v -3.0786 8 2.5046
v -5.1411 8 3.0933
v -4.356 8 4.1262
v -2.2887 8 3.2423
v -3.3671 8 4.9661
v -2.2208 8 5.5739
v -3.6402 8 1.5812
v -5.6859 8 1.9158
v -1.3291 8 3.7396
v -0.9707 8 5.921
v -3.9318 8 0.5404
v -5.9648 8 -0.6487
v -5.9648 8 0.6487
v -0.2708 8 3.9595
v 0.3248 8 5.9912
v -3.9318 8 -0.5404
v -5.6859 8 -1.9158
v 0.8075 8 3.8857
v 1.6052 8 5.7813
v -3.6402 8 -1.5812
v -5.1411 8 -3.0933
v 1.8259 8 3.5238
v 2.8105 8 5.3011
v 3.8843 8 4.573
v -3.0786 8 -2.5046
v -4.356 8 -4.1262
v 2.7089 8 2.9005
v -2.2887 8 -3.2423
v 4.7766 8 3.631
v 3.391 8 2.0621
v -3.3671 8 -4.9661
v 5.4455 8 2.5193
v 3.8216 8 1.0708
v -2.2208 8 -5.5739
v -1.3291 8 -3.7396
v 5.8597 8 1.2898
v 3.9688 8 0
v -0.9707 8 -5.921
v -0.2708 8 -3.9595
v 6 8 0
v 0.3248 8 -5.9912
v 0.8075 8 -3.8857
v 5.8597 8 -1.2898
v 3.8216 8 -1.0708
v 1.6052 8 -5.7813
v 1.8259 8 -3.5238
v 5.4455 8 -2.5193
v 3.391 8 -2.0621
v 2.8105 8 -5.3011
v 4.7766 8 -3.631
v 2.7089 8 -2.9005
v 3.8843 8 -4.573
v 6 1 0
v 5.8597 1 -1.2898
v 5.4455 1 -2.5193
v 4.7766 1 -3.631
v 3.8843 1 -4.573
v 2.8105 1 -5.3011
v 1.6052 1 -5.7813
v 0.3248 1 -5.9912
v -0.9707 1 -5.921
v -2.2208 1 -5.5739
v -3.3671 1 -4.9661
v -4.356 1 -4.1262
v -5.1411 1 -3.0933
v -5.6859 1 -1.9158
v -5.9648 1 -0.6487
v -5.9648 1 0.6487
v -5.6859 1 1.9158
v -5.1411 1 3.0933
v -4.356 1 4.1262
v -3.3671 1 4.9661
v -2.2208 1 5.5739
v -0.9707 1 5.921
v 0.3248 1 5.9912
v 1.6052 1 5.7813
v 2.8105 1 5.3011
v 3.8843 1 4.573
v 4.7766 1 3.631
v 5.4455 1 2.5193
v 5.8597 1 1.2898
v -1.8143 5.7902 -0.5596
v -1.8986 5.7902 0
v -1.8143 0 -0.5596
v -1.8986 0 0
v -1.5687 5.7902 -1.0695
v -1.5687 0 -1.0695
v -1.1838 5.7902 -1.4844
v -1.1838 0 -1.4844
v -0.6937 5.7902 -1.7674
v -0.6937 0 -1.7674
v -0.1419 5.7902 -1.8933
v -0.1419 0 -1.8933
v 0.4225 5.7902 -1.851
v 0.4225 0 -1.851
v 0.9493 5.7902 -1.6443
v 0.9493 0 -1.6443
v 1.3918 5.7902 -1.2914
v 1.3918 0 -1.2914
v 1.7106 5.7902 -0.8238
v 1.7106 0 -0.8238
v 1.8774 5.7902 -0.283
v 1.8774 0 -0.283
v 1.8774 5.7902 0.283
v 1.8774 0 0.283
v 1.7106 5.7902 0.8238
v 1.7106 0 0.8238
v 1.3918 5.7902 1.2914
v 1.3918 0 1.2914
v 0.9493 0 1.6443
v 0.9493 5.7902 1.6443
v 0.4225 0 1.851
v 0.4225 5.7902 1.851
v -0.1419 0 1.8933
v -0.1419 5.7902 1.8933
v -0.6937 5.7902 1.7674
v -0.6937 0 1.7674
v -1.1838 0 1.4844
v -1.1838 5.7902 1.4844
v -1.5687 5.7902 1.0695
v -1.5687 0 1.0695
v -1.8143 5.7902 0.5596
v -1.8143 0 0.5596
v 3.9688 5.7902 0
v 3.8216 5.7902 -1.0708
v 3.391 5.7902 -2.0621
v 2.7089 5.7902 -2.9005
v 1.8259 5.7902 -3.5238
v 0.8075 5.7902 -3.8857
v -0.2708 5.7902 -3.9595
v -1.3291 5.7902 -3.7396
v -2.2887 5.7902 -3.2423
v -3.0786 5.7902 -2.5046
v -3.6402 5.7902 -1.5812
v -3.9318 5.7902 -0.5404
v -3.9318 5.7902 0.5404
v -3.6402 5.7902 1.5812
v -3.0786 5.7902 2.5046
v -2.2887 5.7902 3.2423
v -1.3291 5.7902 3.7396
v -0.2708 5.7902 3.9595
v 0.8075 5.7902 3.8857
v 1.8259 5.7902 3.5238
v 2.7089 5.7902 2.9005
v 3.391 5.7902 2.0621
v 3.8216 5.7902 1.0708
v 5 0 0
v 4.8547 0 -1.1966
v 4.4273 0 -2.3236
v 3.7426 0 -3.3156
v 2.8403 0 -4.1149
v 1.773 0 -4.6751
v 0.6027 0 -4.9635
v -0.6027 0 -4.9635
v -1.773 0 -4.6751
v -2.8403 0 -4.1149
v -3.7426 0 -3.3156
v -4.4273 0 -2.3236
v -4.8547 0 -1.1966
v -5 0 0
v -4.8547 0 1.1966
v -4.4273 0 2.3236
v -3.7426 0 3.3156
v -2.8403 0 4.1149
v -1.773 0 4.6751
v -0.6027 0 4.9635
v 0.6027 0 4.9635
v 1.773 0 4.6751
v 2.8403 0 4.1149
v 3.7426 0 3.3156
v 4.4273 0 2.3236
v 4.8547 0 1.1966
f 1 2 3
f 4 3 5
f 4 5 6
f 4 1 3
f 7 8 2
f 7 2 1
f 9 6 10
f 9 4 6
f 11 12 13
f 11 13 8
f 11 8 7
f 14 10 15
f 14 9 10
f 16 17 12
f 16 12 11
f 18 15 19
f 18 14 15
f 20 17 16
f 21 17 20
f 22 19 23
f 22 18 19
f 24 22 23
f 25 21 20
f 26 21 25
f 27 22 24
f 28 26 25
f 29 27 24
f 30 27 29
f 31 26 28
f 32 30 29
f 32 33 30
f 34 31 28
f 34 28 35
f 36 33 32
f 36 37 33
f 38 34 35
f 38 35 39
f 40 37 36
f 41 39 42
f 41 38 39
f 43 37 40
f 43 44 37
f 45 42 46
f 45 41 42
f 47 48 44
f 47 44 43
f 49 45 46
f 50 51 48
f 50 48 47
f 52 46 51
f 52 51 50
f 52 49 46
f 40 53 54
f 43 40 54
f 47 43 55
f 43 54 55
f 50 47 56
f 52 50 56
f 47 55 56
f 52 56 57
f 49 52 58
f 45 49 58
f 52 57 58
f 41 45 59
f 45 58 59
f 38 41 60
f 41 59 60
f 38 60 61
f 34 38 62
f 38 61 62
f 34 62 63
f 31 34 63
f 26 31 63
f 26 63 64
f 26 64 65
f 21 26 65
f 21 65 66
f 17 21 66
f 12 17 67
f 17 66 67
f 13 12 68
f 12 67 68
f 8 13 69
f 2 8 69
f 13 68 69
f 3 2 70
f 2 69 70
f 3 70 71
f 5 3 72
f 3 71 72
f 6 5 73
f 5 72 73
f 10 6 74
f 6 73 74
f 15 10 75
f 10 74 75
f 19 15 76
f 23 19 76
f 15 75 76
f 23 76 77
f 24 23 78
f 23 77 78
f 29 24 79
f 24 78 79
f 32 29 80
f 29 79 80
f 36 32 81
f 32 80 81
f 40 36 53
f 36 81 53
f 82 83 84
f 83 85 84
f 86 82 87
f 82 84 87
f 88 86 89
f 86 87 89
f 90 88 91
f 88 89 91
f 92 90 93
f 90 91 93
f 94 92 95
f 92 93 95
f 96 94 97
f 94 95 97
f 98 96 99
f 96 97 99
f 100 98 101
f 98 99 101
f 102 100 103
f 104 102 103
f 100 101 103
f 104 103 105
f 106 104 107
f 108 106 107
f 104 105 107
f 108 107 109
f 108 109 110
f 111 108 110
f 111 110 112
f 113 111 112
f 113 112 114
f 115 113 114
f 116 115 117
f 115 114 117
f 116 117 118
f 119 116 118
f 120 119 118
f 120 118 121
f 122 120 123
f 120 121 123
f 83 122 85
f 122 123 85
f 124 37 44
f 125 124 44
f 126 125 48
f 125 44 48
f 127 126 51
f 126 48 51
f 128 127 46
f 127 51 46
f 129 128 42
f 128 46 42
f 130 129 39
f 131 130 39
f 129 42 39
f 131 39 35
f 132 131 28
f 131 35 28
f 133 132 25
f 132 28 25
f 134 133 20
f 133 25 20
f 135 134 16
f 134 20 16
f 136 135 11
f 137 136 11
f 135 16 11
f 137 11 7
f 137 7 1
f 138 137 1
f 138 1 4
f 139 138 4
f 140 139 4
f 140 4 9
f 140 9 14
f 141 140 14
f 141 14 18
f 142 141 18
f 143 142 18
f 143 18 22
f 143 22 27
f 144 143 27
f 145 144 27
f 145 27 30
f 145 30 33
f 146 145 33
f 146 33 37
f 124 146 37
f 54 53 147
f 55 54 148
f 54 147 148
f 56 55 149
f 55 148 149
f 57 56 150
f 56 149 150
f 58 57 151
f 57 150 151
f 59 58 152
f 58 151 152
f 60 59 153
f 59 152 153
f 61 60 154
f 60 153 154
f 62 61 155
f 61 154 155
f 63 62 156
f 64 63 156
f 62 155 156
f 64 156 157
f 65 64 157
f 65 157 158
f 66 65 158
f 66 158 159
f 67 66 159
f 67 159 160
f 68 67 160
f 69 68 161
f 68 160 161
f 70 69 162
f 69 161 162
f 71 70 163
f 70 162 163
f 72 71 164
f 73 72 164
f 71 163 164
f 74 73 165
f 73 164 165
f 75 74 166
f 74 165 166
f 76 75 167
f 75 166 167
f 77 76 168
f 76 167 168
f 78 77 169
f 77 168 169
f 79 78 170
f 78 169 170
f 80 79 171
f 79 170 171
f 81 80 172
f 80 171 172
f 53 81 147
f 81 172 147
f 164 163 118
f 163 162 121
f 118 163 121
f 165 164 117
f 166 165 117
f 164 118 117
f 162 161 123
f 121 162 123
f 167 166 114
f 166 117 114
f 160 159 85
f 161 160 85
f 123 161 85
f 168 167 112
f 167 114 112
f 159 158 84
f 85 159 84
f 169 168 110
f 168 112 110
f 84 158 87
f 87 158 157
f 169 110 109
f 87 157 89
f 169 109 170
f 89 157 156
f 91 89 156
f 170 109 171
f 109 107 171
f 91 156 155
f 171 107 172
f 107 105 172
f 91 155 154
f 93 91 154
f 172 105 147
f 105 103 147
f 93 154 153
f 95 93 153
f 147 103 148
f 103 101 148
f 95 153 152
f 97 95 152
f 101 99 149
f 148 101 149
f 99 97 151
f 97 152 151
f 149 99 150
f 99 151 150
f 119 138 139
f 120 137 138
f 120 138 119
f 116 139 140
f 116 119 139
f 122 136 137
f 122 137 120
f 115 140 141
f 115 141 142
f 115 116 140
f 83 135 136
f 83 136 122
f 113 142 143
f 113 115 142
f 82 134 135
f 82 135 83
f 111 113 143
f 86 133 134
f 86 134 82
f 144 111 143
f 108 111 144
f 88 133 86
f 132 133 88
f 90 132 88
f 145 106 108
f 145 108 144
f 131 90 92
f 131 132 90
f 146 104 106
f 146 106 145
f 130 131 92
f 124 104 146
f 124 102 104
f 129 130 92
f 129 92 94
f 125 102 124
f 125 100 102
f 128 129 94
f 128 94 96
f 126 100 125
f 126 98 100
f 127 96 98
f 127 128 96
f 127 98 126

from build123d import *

# Parameters (mm, degrees)
SKETCH1_R                                           = 6
BOSS_EXTRUDE1_DEPTH                                 = 8
CBORE_FOR_6_BINDING_HEAD_MACHINE_SCREW2_D           = 3.7973
CBORE_FOR_6_BINDING_HEAD_MACHINE_SCREW2_CBORE_D     = 7.9375
CBORE_FOR_6_BINDING_HEAD_MACHINE_SCREW2_CBORE_DEPTH = 2.2098
CHAMFER1_SIZE                                       = 1


with BuildPart() as part:
    # Sketch1 → Boss-Extrude1 (new body)
    with BuildSketch(Plane(origin=(0, 0, 0), x_dir=(1, 0, 0), z_dir=(0, 1, 0))):
        Circle(SKETCH1_R)
    extrude(amount=BOSS_EXTRUDE1_DEPTH)

    # CBORE for #6 Binding Head Machine Screw2 (through all)
    with Locations(Plane(origin=(0, 8, 0), x_dir=(1, 0, 0), z_dir=(0, 1, 0))):
        with Locations((0, 0)):
            CounterBoreHole(CBORE_FOR_6_BINDING_HEAD_MACHINE_SCREW2_D / 2, CBORE_FOR_6_BINDING_HEAD_MACHINE_SCREW2_CBORE_D / 2, CBORE_FOR_6_BINDING_HEAD_MACHINE_SCREW2_CBORE_DEPTH)

    # Chamfer1
    chamfer1_edges = [part.edges().sort_by_distance(p)[0] for p in [
        (-6, 0, 0),
    ]]
    chamfer(chamfer1_edges, length=CHAMFER1_SIZE)


solid = part.part
